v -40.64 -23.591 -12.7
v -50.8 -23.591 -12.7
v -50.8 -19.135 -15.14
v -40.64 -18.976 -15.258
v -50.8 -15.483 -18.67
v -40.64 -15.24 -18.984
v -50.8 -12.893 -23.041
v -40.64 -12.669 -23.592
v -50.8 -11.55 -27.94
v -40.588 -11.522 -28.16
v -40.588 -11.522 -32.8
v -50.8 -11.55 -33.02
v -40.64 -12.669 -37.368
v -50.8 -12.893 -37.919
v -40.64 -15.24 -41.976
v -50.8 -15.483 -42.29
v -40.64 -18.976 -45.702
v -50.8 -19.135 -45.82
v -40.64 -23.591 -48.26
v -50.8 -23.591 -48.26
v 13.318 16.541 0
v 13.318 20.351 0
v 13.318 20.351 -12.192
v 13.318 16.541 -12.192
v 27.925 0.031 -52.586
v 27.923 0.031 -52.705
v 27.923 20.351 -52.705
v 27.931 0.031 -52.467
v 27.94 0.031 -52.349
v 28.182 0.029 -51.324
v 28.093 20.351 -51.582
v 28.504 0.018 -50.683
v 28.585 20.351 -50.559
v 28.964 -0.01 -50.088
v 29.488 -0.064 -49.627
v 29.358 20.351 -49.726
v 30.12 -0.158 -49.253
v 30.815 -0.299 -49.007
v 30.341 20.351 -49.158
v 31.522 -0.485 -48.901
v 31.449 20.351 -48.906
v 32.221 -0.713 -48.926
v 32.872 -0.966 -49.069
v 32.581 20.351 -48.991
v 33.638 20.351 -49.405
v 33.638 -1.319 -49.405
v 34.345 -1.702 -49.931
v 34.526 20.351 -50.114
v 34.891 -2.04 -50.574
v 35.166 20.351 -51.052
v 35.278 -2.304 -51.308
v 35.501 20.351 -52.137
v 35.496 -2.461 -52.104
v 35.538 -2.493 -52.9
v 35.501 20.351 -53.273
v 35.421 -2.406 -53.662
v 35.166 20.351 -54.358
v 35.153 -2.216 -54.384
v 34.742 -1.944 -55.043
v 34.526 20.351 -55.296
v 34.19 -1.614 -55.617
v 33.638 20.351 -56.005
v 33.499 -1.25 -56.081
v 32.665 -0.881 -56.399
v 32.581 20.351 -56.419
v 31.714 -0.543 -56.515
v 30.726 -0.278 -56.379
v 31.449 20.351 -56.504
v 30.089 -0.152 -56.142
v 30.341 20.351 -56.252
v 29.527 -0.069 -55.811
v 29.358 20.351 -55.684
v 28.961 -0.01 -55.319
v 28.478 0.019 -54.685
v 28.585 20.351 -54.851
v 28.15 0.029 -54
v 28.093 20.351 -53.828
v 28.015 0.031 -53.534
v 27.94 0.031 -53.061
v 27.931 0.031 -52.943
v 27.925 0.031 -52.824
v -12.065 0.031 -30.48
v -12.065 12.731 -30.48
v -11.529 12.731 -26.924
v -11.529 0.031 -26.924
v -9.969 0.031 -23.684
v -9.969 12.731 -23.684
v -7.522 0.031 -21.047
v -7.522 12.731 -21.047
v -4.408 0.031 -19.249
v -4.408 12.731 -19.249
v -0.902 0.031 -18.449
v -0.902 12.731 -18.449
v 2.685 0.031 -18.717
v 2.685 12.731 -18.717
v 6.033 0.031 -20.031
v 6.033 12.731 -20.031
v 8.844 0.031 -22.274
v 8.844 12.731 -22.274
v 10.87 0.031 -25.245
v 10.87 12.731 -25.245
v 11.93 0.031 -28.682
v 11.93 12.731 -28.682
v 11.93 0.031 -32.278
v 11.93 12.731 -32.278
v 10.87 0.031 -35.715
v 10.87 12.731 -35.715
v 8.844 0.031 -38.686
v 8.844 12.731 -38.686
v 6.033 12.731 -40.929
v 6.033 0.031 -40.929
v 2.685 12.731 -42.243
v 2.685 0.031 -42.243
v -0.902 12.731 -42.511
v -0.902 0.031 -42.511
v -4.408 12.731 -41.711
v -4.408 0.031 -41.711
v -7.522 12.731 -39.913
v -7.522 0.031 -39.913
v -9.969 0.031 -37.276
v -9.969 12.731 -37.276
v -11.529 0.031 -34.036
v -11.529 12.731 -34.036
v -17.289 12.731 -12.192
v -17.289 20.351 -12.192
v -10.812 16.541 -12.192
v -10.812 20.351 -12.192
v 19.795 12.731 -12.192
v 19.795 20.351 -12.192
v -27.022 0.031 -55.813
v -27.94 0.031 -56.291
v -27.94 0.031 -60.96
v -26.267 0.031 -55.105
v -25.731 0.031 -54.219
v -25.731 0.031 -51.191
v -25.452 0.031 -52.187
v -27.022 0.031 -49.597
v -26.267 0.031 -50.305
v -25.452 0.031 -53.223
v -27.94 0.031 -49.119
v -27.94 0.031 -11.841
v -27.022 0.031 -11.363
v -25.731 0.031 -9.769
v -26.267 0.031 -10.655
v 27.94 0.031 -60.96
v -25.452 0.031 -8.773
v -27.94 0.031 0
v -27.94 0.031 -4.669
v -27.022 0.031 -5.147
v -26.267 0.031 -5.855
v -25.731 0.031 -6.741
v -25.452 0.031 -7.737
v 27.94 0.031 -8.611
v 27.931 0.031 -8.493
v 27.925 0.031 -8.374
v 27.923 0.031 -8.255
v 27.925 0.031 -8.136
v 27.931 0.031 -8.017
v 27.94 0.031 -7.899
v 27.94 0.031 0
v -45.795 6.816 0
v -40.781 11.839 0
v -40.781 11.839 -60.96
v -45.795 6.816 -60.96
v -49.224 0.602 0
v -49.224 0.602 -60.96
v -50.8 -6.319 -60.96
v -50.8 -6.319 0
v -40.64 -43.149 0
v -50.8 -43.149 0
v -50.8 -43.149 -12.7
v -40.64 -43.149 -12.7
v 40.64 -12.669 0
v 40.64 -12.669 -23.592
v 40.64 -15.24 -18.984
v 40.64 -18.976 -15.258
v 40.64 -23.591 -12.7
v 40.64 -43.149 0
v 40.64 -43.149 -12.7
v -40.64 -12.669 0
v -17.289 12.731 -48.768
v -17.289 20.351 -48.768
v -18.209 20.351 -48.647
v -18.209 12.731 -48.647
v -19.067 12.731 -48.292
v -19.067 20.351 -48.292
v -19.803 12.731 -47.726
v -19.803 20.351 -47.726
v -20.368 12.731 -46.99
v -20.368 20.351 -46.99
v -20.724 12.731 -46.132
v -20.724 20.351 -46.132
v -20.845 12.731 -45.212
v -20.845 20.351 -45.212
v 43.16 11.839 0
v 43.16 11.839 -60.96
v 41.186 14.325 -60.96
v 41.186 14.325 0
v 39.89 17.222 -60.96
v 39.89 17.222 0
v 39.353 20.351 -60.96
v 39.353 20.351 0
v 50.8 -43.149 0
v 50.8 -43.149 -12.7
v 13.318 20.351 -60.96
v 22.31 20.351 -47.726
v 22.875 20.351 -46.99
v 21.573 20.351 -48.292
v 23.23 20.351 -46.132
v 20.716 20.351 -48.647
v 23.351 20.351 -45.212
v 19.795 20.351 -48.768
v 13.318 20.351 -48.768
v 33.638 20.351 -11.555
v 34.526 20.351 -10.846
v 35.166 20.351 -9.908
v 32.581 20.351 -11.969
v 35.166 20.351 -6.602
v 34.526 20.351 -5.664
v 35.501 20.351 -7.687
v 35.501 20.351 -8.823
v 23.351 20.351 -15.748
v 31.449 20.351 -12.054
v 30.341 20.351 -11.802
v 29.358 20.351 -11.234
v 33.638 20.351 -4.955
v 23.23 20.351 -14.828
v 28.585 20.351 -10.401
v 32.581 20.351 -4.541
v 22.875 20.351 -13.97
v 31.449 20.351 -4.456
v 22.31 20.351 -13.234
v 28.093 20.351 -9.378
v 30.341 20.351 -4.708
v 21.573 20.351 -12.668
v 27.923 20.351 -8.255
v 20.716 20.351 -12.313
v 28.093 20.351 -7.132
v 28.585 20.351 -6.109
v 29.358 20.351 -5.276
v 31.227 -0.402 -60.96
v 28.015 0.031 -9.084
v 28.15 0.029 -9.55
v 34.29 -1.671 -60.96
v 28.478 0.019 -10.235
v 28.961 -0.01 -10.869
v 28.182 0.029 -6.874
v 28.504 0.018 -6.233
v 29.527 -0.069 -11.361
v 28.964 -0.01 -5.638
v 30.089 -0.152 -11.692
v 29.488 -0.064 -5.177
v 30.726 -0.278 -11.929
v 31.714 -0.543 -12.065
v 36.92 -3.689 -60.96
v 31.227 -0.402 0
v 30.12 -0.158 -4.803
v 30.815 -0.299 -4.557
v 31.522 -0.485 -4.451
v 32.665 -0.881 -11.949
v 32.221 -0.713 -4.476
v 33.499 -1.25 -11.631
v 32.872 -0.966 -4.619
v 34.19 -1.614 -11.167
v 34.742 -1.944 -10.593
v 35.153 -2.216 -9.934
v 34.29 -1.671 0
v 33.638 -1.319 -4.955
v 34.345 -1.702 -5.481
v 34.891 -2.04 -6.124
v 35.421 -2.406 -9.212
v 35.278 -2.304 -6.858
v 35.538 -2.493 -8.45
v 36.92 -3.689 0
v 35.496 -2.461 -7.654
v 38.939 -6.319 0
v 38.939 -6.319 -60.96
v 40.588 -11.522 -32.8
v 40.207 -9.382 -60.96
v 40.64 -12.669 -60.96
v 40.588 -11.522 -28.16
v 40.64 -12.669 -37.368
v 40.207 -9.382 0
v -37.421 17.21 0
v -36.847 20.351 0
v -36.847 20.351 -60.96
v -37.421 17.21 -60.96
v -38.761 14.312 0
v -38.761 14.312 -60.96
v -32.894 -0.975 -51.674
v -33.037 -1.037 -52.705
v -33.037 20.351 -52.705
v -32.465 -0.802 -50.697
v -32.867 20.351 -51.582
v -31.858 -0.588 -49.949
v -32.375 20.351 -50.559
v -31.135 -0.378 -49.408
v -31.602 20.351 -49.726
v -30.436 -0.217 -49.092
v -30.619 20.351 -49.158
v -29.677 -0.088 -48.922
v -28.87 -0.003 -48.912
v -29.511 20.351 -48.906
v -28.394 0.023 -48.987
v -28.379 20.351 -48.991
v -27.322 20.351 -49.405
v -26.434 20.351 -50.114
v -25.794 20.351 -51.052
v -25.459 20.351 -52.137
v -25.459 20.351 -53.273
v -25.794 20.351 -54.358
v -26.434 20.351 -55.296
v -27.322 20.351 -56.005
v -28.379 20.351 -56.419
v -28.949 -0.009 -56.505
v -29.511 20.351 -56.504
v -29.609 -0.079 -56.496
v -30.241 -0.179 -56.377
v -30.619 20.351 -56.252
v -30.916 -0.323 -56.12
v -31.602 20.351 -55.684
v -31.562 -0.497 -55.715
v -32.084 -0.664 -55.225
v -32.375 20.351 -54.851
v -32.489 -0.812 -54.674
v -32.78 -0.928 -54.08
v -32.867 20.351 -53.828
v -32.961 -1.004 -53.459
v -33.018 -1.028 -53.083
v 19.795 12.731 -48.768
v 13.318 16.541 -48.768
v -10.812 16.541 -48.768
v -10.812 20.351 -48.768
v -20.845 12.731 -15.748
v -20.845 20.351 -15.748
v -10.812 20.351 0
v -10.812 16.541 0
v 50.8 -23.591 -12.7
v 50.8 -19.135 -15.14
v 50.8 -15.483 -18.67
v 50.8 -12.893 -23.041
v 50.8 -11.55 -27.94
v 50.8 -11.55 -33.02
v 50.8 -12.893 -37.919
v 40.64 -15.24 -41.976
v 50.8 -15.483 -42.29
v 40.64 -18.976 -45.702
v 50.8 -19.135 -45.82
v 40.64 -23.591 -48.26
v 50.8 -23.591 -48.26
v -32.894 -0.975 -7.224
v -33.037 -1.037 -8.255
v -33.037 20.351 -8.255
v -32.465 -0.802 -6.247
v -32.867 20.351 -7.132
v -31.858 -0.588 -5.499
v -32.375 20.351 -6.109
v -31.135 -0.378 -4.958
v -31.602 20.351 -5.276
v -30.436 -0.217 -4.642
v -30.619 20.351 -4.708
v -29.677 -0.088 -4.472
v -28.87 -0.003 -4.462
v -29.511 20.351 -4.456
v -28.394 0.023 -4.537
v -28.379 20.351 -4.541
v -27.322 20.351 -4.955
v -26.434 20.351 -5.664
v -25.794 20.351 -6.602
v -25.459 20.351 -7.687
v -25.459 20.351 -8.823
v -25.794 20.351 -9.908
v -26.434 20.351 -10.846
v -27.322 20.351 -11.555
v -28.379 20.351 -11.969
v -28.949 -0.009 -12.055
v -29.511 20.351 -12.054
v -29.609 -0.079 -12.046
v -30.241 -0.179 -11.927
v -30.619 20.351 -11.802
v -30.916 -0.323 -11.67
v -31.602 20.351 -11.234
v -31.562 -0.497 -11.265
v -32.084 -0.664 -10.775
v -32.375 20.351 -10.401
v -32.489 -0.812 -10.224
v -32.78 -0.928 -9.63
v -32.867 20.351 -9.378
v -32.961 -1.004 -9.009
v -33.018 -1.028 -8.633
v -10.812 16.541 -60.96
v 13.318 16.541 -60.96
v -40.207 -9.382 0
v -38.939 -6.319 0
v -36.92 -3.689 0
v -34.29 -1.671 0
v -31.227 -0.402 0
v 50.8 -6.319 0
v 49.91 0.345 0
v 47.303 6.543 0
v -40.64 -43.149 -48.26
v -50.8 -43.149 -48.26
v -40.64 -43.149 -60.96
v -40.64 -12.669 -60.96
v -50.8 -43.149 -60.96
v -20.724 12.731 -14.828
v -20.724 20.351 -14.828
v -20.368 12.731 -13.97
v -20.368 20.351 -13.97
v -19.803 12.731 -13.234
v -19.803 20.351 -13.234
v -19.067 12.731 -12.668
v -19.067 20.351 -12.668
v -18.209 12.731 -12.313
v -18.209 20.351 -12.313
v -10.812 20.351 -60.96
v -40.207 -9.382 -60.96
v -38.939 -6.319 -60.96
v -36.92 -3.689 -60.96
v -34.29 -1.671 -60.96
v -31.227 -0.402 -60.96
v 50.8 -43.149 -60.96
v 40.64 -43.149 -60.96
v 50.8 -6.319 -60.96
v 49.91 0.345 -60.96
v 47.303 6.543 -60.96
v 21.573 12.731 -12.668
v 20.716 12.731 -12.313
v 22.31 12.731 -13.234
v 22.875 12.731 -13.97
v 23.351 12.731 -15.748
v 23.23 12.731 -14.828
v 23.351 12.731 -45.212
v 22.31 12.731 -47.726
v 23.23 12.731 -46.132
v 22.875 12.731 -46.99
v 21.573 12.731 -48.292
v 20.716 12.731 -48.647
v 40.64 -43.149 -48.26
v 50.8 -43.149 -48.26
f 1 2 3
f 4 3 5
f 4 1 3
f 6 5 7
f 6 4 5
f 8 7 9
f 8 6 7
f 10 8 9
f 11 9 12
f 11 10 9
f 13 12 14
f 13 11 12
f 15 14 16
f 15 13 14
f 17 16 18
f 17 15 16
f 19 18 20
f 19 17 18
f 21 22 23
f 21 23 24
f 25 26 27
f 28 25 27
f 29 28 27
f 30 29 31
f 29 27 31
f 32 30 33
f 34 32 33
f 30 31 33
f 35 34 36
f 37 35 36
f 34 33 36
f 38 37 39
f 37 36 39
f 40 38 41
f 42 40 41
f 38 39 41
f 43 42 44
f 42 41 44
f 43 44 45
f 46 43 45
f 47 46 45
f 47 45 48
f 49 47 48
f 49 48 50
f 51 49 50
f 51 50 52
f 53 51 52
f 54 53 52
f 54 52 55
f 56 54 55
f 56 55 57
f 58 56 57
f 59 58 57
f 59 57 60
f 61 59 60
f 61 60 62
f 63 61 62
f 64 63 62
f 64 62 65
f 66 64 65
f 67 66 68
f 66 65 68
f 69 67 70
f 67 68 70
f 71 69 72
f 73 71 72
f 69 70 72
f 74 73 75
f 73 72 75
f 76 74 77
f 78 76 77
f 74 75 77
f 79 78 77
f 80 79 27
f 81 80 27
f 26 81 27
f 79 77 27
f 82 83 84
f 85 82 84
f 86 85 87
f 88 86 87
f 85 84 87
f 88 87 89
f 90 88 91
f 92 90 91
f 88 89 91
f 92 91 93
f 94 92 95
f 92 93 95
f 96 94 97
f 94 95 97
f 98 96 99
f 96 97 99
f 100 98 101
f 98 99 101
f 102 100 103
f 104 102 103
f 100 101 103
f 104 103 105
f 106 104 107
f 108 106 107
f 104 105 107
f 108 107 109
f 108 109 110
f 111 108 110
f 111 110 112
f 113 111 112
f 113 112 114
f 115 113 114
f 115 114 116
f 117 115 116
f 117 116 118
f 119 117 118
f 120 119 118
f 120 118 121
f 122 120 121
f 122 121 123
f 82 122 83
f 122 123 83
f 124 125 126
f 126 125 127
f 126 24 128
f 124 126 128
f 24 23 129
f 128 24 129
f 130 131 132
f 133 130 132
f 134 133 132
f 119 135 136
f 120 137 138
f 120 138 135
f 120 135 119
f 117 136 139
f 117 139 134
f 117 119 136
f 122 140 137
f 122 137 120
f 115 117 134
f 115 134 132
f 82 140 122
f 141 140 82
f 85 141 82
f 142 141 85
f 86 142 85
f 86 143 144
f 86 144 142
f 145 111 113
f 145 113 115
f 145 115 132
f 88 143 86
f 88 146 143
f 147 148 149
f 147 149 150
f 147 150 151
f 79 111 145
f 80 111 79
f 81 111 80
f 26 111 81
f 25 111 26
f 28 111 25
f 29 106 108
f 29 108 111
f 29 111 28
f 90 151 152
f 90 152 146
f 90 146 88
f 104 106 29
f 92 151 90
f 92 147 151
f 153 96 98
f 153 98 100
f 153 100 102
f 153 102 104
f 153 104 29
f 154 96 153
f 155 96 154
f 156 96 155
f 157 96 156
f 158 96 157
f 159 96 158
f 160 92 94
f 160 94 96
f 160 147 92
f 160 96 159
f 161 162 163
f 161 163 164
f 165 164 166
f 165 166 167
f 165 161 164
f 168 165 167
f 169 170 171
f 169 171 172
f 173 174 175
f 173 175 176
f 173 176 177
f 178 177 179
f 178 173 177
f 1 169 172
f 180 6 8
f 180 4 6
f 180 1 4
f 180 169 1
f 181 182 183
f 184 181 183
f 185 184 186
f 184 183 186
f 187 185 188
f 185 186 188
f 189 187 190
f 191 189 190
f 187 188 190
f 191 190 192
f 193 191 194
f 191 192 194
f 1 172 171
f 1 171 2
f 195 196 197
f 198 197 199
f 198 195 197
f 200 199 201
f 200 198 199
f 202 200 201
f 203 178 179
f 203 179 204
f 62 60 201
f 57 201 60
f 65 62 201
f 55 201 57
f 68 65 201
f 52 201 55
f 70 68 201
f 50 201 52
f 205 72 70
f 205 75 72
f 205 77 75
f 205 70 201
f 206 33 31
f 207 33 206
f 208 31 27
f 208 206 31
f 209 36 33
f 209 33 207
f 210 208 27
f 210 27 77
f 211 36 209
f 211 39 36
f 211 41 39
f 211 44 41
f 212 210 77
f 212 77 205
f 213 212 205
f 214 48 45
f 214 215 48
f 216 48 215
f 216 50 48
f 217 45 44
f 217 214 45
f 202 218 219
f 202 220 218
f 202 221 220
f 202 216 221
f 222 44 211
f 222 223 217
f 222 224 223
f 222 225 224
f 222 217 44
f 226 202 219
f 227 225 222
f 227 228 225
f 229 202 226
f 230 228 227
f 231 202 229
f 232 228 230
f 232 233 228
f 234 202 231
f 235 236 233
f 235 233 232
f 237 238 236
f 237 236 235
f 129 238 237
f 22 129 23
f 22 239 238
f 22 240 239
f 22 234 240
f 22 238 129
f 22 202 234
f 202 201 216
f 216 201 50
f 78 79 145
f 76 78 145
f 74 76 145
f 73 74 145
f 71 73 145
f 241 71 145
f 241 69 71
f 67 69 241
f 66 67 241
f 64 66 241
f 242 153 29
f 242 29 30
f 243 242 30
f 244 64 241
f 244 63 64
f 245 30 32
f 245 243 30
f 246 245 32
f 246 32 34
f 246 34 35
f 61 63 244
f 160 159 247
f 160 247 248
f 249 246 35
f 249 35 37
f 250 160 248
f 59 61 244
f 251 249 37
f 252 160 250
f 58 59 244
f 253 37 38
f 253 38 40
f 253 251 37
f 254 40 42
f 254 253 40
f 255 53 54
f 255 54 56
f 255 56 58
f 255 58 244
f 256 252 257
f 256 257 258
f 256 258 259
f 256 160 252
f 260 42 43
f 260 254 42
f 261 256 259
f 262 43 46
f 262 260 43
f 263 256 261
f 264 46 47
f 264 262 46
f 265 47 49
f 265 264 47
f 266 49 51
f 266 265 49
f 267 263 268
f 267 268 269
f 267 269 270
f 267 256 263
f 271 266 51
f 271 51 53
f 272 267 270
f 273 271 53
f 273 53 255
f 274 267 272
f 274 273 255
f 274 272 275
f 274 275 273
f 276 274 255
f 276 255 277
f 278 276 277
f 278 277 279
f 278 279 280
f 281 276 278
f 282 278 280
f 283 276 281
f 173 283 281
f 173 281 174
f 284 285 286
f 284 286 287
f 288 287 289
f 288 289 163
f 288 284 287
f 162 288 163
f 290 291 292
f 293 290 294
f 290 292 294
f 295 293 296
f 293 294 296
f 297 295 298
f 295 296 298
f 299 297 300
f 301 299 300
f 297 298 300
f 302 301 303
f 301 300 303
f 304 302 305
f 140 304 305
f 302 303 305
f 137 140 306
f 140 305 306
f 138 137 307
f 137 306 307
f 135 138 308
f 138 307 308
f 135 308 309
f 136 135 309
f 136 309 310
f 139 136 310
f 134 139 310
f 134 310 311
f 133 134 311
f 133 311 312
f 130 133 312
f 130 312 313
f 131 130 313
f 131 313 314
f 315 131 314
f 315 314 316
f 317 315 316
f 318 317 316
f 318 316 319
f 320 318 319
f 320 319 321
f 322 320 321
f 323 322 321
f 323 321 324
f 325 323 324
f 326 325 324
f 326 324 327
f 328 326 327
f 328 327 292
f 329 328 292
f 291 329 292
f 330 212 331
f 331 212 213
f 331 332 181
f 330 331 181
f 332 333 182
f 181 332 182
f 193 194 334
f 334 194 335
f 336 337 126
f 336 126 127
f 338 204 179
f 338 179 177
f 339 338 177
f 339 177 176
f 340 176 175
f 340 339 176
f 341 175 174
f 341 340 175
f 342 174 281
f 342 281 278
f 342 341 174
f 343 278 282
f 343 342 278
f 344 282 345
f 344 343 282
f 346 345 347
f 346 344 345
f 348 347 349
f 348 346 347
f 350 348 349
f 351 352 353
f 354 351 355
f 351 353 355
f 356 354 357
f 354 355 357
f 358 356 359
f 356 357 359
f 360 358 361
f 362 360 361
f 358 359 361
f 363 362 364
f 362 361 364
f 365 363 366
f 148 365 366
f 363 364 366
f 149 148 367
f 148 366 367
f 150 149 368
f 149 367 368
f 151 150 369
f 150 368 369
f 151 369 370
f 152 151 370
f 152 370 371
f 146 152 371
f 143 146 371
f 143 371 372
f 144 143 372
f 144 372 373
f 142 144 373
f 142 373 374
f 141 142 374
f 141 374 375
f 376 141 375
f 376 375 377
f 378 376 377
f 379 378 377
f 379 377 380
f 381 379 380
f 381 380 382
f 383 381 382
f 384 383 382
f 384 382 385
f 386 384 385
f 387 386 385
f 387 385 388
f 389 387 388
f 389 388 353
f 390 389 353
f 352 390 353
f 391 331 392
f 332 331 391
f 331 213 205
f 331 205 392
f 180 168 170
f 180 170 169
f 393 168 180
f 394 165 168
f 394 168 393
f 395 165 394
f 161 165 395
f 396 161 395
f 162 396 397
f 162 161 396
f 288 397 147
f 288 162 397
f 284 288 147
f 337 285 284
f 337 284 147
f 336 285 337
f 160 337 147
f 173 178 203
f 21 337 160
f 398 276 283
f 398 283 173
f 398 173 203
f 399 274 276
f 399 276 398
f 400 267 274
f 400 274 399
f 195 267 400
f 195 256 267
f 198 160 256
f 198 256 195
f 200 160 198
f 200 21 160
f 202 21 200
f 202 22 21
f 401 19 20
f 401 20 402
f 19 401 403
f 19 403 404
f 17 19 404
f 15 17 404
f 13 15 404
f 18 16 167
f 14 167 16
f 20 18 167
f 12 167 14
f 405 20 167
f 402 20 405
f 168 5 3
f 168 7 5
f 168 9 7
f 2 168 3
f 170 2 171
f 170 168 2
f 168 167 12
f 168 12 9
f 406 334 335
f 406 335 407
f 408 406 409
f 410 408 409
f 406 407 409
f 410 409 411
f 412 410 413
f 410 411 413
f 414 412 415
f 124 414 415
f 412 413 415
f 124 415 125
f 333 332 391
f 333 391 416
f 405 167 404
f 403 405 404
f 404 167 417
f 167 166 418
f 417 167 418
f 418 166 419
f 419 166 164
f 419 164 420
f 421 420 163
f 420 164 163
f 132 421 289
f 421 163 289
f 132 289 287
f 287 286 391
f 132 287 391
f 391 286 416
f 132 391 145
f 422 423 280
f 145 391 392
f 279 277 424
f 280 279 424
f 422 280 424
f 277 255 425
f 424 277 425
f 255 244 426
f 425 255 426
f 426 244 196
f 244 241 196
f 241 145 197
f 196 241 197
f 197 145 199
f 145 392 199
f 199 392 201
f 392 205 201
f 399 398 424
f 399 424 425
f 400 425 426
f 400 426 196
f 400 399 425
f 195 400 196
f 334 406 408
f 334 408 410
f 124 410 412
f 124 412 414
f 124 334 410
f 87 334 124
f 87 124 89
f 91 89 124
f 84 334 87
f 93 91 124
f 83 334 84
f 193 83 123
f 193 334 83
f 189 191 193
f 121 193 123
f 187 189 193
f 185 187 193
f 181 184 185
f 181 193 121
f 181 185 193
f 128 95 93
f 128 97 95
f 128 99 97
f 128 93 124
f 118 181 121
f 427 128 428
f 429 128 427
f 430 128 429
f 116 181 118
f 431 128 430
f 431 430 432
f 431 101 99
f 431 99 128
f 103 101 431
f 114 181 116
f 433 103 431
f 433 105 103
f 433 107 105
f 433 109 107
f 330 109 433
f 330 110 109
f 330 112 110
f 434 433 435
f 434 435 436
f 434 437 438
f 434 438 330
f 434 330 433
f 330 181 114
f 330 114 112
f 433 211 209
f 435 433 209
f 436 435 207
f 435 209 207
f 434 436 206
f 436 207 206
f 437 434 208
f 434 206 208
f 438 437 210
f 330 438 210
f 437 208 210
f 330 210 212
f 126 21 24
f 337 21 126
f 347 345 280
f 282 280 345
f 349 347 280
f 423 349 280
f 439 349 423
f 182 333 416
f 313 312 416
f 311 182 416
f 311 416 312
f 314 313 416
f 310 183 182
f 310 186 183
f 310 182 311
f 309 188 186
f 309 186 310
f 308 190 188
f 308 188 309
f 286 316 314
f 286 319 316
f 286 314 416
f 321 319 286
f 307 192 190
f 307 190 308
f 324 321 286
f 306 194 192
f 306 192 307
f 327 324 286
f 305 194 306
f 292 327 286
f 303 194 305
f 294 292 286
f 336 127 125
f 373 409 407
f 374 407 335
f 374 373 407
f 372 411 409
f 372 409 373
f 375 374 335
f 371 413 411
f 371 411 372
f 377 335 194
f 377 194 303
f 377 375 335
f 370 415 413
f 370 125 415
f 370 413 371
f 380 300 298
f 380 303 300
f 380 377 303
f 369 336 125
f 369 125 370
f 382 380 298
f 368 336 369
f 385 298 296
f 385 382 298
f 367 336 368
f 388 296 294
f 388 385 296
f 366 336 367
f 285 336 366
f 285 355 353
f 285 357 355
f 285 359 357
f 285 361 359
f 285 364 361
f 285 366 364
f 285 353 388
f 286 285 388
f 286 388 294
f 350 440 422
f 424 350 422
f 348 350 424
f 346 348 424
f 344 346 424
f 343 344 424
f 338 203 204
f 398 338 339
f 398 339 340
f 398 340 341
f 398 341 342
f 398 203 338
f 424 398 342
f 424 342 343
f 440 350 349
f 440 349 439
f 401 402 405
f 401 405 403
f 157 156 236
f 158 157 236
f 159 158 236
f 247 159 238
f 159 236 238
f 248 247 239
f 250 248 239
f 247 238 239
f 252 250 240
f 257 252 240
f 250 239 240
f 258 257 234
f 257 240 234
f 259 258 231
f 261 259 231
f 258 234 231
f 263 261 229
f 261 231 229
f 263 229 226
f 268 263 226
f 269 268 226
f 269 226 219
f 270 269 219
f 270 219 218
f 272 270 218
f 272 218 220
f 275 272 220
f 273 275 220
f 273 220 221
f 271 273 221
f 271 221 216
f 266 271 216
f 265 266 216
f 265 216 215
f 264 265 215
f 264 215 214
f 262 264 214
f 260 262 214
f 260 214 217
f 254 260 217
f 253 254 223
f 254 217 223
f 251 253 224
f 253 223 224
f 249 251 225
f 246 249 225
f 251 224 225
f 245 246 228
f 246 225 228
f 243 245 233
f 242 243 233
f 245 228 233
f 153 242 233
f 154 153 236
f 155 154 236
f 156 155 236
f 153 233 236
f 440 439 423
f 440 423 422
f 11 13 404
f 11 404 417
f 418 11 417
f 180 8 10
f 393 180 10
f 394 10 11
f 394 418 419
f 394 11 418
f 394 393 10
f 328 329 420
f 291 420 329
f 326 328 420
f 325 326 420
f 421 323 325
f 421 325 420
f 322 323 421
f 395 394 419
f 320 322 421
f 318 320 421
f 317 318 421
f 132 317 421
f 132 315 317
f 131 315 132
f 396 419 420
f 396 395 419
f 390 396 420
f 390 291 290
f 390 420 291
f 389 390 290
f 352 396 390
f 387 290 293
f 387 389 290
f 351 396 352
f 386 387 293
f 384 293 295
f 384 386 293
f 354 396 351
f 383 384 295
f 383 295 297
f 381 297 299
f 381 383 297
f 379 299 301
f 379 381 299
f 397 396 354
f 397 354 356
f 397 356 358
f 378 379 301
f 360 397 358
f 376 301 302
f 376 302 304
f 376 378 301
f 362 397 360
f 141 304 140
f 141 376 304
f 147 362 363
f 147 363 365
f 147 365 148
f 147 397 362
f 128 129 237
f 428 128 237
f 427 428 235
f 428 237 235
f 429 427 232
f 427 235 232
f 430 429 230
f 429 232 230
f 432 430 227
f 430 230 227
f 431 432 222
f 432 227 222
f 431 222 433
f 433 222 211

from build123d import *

# Parameters (mm, degrees)
BOSS_EXTRUDE1_DEPTH = 60.96
CUT_EXTRUDE1_DEPTH  = 101.6
CUT_EXTRUDE2_DEPTH  = 7.62
SKETCH6_R           = 12.065
CUT_EXTRUDE3_DEPTH  = 12.7
SKETCH7_R           = 3.81
CUT_EXTRUDE5_DEPTH  = 102.631745151


with BuildPart() as part:
    # Sketch3 → Boss-Extrude1 (new body)
    with BuildSketch(Plane.XY):
        with BuildLine():
            Line((-27.94, 0.030892605), (27.94, 0.030892605))
            ThreePointArc((27.94, 0.030892605), (36.920256121, -3.688851274), (40.64, -12.669107395))
            Line((40.64, -12.669107395), (40.64, -43.149107395))
            Line((40.64, -43.149107395), (50.8, -43.149107395))
            Line((50.8, -43.149107395), (50.8, -6.319107395))
            ThreePointArc((50.8, -6.319107395), (48.812332806, 3.530901366), (43.160419482, 11.83929286))
            ThreePointArc((43.160419482, 11.83929286), (40.447471444, 15.733062174), (39.353319429, 20.350892605))
            Line((39.353319429, 20.350892605), (13.318319429, 20.350892605))
            Line((13.318319429, 20.350892605), (13.318319429, 16.540892605))
            Line((13.318319429, 16.540892605), (-10.811680571, 16.540892605))
            Line((-10.811680571, 16.540892605), (-10.811680571, 20.350892605))
            Line((-10.811680571, 20.350892605), (-36.846680571, 20.350892605))
            ThreePointArc((-36.846680571, 20.350892605), (-37.999423394, 15.718716246), (-40.780780624, 11.83929286))
            ThreePointArc((-40.780780624, 11.83929286), (-47.728103025, 3.829260087), (-50.8, -6.319107395))
            Line((-50.8, -6.319107395), (-50.8, -43.149107395))
            Line((-50.8, -43.149107395), (-40.64, -43.149107395))
            Line((-40.64, -43.149107395), (-40.64, -12.669107395))
            ThreePointArc((-40.64, -12.669107395), (-36.920256121, -3.688851274), (-27.94, 0.030892605))
        make_face()
    extrude(amount=-BOSS_EXTRUDE1_DEPTH)

    # Sketch4 → Cut-Extrude1 (cut)
    with BuildSketch(Plane(origin=(50.8, 0, 0), x_dir=(0, 0, -1), z_dir=(1, 0, 0))):
        with BuildLine():
            Line((12.7, -43.149107395), (12.7, -23.591107395))
            ThreePointArc((12.7, -23.591107395), (30.48, -11.3802667), (48.26, -23.591107395))
            Line((48.26, -23.591107395), (48.26, -43.149107395))
            Line((48.26, -43.149107395), (12.7, -43.149107395))
        make_face()
    extrude(amount=-CUT_EXTRUDE1_DEPTH, mode=Mode.SUBTRACT)

    # Sketch5 → Cut-Extrude2 (cut)
    with BuildSketch(Plane(origin=(0, 20.350892605, 0), x_dir=(1, 0, 0), z_dir=(0, 1, 0))):
        with BuildLine():
            Line((-20.844680571, 45.212), (-20.844680571, 15.748))
            ThreePointArc((-20.844680571, 15.748), (-19.803152285, 13.233528286), (-17.288680571, 12.192))
            Line((-17.288680571, 12.192), (19.795319429, 12.192))
            ThreePointArc((19.795319429, 12.192), (22.309791143, 13.233528286), (23.351319429, 15.748))
            Line((23.351319429, 15.748), (23.351319429, 45.212))
            ThreePointArc((23.351319429, 45.212), (22.309791143, 47.726471714), (19.795319429, 48.768))
            Line((19.795319429, 48.768), (-17.288680571, 48.768))
            ThreePointArc((-17.288680571, 48.768), (-19.803152285, 47.726471714), (-20.844680571, 45.212))
        make_face()
    extrude(amount=-CUT_EXTRUDE2_DEPTH, mode=Mode.SUBTRACT)

    # Sketch6 → Cut-Extrude3 (cut)
    with BuildSketch(Plane(origin=(0, 12.730892605, 0), x_dir=(1, 0, 0), z_dir=(0, 1, 0))):
        with Locations(Location((0, 30.48, 0), (0, 0, 180))):
            Circle(SKETCH6_R)
    extrude(amount=-CUT_EXTRUDE3_DEPTH, mode=Mode.SUBTRACT)

    # Sketch7 → Cut-Extrude5 (cut, through all)
    with BuildSketch(Plane(origin=(0, 20.350892605, 0), x_dir=(1, 0, 0), z_dir=(0, 1, 0))):
        with Locations(Location((-29.226680571, 52.705, 0), (0, 0, 180))):
            Circle(SKETCH7_R)
        with Locations(Location((31.733319429, 52.705, 0), (0, 0, 180))):
            Circle(SKETCH7_R)
        with Locations(Location((31.733319429, 8.255, 0), (0, 0, 180))):
            Circle(SKETCH7_R)
        with Locations(Location((-29.226680571, 8.255, 0), (0, 0, 180))):
            Circle(SKETCH7_R)
    extrude(amount=-CUT_EXTRUDE5_DEPTH, mode=Mode.SUBTRACT)


solid = part.part
